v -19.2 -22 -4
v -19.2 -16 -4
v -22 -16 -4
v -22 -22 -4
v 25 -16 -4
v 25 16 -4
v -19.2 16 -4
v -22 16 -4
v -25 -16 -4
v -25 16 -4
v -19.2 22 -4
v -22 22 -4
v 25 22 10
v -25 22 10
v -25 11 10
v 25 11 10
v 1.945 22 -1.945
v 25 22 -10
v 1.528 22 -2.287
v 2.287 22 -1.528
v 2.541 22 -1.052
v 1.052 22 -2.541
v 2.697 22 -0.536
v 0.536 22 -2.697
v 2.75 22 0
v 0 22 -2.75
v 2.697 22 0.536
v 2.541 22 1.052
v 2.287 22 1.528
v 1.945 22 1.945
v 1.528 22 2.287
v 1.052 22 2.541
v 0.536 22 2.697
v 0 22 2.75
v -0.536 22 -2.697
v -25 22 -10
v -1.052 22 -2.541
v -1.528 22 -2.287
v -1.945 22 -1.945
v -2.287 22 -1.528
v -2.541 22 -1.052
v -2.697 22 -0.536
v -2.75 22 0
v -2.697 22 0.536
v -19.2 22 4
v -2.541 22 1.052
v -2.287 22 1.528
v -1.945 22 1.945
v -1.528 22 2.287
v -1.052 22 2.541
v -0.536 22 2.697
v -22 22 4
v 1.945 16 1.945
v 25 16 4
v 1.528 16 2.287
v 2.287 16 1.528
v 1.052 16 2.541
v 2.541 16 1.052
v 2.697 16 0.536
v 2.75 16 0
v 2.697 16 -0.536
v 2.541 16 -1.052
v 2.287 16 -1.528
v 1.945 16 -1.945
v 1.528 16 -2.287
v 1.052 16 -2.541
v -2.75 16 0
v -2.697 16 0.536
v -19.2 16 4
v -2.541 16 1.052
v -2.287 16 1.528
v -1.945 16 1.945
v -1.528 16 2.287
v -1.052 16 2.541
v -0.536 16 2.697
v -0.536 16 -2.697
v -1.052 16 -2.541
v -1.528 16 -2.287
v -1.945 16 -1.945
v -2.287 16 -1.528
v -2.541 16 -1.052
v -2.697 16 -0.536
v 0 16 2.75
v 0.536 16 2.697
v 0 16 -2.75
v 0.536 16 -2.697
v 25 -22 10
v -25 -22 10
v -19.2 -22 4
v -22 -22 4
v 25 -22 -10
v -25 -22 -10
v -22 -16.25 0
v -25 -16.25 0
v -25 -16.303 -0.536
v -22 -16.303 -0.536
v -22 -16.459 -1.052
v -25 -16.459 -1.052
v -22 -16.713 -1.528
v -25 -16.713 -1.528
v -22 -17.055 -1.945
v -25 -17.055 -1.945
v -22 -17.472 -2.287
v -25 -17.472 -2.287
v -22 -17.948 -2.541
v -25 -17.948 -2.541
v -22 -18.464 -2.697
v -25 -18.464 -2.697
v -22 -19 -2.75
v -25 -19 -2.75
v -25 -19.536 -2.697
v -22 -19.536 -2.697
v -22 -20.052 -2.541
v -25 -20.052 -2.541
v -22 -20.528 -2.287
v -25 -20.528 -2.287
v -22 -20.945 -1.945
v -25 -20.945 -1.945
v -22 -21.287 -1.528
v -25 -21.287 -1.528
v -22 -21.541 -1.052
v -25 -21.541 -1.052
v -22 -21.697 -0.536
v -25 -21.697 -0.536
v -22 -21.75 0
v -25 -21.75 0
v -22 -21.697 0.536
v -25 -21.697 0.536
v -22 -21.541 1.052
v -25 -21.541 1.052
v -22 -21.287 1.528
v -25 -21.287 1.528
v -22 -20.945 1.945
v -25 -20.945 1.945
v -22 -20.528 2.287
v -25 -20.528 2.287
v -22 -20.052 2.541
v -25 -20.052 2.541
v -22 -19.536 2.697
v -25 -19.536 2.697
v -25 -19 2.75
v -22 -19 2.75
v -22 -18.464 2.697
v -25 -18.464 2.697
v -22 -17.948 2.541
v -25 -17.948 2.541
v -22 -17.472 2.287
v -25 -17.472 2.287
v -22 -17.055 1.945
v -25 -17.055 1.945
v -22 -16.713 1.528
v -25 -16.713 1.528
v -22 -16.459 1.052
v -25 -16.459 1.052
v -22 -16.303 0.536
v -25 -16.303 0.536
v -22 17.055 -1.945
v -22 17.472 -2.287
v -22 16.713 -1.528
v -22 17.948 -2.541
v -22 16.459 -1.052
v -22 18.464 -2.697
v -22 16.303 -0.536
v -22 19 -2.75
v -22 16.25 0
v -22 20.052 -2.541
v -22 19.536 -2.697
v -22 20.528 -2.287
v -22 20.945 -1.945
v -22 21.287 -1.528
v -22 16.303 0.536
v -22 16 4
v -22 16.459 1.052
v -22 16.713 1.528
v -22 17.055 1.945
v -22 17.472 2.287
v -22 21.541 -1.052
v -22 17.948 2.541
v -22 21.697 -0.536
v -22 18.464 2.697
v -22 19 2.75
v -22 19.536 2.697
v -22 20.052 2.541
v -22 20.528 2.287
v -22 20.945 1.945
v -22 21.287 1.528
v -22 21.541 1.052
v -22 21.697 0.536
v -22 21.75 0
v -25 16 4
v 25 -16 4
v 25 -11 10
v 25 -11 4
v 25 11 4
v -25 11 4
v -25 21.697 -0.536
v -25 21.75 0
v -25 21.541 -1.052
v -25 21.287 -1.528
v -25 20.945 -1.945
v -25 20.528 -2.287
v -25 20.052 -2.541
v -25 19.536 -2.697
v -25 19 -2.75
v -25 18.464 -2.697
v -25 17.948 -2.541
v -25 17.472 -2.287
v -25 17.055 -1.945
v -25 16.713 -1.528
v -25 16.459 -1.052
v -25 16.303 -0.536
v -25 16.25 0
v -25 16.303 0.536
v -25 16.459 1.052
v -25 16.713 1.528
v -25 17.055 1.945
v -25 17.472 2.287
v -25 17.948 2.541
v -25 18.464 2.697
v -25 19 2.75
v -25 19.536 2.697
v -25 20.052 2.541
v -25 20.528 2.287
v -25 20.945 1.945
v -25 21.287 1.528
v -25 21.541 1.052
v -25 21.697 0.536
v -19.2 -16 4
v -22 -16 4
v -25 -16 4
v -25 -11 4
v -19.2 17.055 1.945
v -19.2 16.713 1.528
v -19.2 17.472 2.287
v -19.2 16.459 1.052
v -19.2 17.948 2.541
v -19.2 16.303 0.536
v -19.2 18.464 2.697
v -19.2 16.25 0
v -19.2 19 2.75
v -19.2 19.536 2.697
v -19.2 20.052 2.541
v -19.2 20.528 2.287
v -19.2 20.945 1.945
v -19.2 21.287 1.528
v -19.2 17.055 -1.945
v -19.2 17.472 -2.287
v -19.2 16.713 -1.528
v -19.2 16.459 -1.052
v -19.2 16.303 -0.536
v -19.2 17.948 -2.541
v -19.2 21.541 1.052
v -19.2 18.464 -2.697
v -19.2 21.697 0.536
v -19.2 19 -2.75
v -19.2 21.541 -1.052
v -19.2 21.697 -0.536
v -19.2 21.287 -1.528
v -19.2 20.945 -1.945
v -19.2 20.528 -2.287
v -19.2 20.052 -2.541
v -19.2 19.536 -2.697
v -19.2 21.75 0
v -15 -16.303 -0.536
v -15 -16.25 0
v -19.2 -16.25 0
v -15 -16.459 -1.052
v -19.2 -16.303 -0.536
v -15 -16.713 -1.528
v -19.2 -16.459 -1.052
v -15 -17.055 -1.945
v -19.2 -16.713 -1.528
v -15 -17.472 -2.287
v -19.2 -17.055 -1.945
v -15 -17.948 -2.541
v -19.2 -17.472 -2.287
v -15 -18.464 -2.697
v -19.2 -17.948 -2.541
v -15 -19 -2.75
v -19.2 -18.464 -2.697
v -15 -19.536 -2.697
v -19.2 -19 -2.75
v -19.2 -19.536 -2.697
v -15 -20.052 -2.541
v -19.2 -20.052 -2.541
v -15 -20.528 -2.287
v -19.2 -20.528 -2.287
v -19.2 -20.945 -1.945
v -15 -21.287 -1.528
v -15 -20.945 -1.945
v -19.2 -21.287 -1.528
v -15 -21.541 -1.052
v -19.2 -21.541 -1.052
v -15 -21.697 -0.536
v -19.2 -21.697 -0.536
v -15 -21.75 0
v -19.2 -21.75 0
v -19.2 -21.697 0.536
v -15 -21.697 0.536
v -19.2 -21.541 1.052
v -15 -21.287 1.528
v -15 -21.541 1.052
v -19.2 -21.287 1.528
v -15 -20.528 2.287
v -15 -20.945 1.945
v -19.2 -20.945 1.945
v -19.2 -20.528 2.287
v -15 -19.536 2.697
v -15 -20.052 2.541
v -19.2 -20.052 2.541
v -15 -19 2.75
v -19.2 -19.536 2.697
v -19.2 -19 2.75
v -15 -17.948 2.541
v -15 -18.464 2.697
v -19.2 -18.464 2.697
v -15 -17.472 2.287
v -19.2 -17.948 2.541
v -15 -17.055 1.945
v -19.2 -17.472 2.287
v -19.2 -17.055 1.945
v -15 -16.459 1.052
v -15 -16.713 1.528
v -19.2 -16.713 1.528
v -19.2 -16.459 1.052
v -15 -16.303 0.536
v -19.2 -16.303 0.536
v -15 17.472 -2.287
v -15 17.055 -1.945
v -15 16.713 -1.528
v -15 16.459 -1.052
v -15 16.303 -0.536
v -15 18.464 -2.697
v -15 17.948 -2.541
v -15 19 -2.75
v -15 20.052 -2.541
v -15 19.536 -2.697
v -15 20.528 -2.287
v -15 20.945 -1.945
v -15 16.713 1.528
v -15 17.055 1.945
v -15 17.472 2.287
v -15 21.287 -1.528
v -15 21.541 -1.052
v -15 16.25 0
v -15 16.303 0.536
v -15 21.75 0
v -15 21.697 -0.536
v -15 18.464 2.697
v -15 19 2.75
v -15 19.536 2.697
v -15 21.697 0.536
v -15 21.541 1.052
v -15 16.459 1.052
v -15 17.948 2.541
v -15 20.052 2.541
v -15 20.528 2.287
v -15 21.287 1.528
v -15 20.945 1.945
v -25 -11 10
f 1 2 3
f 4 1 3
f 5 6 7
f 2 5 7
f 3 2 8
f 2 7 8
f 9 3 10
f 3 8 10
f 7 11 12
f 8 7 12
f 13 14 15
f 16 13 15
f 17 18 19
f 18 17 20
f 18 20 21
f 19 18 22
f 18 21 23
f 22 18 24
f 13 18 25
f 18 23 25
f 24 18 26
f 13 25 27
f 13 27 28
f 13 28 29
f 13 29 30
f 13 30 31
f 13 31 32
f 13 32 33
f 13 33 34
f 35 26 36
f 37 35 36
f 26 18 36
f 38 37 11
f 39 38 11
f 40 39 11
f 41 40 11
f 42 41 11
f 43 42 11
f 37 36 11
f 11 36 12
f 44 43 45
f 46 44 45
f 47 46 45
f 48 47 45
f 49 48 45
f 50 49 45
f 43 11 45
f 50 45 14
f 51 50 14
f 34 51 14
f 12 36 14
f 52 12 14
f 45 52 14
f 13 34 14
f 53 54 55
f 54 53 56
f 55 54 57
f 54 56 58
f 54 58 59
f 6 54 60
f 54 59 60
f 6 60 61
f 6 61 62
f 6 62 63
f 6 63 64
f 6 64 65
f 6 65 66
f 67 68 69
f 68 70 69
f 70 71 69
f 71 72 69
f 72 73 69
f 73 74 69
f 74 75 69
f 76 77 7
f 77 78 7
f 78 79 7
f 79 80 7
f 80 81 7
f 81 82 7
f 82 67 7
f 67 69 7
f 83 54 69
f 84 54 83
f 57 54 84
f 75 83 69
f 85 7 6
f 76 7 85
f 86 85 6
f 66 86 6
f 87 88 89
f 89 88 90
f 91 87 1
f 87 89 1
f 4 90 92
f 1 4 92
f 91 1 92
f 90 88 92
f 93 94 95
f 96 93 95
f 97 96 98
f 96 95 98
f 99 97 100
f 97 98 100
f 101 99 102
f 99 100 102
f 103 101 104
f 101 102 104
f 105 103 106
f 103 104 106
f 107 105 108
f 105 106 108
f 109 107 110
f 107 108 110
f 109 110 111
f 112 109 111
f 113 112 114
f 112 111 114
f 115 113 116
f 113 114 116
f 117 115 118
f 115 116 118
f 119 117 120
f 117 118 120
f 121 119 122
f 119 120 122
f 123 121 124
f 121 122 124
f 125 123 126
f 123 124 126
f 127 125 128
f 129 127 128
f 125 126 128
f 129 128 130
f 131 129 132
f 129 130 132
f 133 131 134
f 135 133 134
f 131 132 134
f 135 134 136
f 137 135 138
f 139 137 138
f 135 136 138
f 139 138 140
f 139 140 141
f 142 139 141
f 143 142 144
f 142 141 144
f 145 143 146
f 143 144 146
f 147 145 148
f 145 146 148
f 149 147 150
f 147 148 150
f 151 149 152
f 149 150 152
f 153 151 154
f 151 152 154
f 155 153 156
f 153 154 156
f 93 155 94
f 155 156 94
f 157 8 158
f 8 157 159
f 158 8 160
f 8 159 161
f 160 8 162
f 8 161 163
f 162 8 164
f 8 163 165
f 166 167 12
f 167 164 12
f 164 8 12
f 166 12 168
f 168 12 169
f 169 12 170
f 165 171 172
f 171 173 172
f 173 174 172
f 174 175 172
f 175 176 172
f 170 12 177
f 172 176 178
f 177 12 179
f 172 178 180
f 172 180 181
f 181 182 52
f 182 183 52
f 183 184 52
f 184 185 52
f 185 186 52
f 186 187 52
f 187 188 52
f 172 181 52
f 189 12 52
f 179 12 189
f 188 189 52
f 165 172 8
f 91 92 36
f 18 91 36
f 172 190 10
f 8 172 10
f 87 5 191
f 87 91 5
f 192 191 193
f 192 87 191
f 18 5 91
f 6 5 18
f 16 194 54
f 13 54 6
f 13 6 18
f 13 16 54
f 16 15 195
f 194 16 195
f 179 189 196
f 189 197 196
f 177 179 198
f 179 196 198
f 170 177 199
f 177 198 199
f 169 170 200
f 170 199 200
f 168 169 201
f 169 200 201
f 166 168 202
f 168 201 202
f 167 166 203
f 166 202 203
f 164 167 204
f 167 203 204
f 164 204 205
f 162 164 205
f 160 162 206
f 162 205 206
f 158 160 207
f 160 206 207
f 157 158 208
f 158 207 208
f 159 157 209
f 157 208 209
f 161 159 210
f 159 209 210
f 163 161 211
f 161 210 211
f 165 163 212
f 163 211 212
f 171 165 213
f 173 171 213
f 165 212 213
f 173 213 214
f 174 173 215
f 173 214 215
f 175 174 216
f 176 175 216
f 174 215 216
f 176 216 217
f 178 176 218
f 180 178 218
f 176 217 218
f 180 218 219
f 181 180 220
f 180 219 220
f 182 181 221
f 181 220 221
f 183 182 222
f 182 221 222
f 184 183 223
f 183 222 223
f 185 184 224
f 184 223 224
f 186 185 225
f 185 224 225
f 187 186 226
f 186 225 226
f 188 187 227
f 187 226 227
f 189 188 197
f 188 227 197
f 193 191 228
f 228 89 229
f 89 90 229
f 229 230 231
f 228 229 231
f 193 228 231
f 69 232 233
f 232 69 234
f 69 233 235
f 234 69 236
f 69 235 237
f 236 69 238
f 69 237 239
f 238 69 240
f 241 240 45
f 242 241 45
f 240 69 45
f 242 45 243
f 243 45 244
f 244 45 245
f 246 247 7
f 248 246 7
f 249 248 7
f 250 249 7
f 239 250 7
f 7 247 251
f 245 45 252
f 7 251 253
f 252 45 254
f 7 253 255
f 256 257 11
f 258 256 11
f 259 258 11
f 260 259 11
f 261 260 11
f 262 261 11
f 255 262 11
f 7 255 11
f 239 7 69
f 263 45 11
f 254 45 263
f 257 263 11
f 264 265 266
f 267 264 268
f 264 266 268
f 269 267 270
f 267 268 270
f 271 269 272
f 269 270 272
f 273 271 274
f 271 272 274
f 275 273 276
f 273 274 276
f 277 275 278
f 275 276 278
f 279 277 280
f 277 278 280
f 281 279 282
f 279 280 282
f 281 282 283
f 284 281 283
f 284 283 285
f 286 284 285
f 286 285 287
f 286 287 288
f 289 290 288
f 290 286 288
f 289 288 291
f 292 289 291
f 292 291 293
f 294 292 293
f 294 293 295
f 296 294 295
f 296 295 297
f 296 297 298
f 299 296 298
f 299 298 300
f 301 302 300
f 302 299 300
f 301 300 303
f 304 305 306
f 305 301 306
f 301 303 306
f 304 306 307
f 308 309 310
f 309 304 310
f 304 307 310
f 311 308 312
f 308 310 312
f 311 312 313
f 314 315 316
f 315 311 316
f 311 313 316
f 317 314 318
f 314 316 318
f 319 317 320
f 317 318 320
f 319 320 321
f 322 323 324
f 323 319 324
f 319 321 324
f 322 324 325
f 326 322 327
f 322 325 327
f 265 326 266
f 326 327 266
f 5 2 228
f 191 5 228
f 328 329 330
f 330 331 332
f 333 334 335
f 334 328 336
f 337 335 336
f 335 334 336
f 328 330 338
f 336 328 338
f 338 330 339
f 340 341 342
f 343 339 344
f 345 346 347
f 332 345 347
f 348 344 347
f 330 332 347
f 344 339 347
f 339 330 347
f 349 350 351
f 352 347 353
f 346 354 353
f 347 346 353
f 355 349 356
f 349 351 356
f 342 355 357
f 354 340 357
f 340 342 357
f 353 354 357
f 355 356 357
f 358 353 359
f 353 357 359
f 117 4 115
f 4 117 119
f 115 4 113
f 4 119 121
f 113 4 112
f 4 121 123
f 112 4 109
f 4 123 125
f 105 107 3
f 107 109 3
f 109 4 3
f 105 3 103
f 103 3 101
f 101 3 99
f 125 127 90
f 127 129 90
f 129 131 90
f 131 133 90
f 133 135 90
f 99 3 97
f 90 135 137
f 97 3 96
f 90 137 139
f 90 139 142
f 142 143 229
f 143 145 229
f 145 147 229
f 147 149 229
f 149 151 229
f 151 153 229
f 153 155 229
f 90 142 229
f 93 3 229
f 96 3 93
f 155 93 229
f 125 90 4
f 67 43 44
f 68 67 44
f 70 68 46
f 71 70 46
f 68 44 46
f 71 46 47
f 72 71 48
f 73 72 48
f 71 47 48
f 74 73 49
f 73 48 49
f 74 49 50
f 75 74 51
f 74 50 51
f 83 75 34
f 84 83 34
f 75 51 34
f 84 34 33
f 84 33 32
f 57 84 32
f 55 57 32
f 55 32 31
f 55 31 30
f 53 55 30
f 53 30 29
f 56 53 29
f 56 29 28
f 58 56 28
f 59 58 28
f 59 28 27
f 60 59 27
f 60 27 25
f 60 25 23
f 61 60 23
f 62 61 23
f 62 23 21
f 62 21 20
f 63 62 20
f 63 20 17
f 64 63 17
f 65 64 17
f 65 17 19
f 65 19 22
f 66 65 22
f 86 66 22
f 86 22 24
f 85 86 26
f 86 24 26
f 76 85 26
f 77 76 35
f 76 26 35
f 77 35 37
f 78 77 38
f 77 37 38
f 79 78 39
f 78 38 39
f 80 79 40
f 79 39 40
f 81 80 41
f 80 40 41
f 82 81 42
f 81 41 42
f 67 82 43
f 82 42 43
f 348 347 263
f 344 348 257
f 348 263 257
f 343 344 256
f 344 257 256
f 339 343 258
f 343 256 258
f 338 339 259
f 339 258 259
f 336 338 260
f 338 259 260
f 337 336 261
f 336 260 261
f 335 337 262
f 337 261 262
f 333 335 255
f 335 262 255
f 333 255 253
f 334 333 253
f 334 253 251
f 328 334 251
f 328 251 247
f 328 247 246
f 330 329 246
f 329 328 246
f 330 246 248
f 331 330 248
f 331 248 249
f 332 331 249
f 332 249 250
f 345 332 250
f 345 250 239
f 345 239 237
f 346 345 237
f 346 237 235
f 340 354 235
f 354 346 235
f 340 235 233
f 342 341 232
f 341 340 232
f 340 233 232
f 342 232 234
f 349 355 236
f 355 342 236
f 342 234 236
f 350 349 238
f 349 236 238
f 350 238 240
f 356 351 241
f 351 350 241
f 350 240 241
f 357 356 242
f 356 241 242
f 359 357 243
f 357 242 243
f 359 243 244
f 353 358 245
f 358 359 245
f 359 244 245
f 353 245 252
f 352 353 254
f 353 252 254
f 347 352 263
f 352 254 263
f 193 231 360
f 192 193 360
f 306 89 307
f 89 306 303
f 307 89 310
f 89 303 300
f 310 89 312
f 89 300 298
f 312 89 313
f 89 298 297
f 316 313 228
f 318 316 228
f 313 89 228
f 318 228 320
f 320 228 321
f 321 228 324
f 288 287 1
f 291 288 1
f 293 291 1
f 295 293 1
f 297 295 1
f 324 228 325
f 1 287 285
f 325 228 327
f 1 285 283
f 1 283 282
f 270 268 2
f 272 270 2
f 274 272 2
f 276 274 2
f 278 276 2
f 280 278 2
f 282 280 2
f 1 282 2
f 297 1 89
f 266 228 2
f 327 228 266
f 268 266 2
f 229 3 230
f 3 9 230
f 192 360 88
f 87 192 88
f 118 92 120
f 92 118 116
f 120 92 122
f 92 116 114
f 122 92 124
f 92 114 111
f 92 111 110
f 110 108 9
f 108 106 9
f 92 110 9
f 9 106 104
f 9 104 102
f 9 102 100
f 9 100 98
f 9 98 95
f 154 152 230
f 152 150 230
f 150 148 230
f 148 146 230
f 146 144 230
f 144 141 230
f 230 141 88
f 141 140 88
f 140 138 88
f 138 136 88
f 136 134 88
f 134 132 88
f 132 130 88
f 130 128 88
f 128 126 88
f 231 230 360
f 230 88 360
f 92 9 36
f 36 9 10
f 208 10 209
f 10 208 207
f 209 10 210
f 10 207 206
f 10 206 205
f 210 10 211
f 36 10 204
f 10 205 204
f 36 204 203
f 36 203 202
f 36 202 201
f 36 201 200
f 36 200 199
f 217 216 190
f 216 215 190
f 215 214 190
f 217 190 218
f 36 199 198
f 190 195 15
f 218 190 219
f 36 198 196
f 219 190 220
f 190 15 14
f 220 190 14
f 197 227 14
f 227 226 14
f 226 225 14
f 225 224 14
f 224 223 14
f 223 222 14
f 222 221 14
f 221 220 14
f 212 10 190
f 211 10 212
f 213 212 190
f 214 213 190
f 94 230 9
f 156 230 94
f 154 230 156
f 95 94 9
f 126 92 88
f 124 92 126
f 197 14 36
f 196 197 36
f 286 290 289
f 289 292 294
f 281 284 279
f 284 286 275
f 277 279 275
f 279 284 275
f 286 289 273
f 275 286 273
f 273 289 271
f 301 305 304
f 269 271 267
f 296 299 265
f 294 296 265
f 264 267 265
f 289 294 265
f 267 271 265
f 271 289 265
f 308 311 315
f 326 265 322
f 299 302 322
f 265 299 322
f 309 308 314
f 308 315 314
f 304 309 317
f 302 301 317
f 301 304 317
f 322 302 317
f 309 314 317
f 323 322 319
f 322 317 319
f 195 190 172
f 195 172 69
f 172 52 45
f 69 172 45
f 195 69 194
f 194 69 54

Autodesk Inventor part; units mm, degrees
ref_plane "XY Plane" through (0, 0, 0) normal (0, 0, 1) x (1, 0, 0)
sketch "Sketch1" plane through (0, 0, 0) normal (1, 0, 0) x (0, 1, 0)
  line L0 (11, 10) -> (11, 4)
  line L1 (11, 4) -> (16, 4)
  line L2 (16, 4) -> (16, -4)
  line L3 (16, -4) -> (-16, -4)
  line L4 (-16, -4) -> (-16, 4)
  line L5 (-16, 4) -> (-11, 4)
  line L6 (-11, 4) -> (-11, 10)
  line L7 (-11, 10) -> (-22, 10)
  line L8 (-22, 10) -> (-22, -10)
  line L9 (-22, -10) -> (22, -10)
  line L10 (22, -10) -> (22, 10)
  line L11 (22, 10) -> (11, 10)
  line L12 (11, 7) -> (-11, 7) construction
  line L13 (16, 0) -> (-16, 0) construction
  point P0 (0, 0)
  point P1 (-13.5, 4)
  point P2 (13.5, 4)
  point P3 (16.5, 10)
  point P4 (-16.5, 10)
  point P5 (22, 0)
  point P6 (0, -10)
  point P7 (0, 7)
  point P8 (0, 0)
  dimension "d0" = 22
  dimension "d1" = 32
  dimension "d2" = 6
  dimension "d3" = 14
  dimension "d4" = 44
  dimension "d5" = 20
extrude "Extrusion1" add sketch "Sketch1" along normal mid plane 50
ref_plane "Work Plane1" through (0, 22, 0) normal (0, 1, 0) x (-1, 0, 0)
sketch "Sketch2" plane through (0, 22, 0) normal (0, 1, 0) x (-1, 0, 0)
  line L0 (25, 10) -> (-25, 10) construction
  line L1 (-25, -10) -> (-25, 10) construction
  line L2 (25, -10) -> (-25, -10) construction
  line L3 (25, 10) -> (25, -10) construction
  line L4 (-25, 0) -> (25, 0) construction
  circle A0 centre (0, 0) radius 2.75
  point P0 (0, 0)
  dimension "d9" = 5.5
  dimension "d10" = 25
extrude "Extrusion2" cut sketch "Sketch2" against normal up to surface (6 mm away)
sketch "Sketch3" plane through (0, 22, 0) normal (0, 1, 0) x (-1, 0, 0)
  line L0 (22, 4) -> (19.2, 4)
  line L1 (19.2, 4) -> (19.2, -4)
  line L2 (19.2, -4) -> (22, -4)
  line L3 (22, -4) -> (22, 4)
  line L4 (25, 10) -> (25, -10) construction
  point P0 (0, 0)
  point P1 (19.2, 0)
  dimension "d13" = 8
  dimension "d14" = 3
  dimension "d15" = 2.8
extrude "Extrusion3" cut sketch "Sketch3" against normal through all
ref_plane "Work Plane2" through (-25, 0, 0) normal (1, 0, 0) x (0, 1, 0)
sketch "Sketch4" plane through (-25, 0, 0) normal (1, 0, 0) x (0, 1, 0)
  circle A0 centre (19, 0) radius 2.75
  line L0 (0, -10) -> (0, 10) construction
  line L1 (22, -10) -> (-22, -10) construction
  circle A1 centre (-19, 0) radius 2.75
  point P0 (0, 0)
  point P1 (11, 10)
  point P2 (0, 0)
  dimension "d19" = 5.5
  dimension "d20" = 19
extrude "Extrusion4" cut sketch "Sketch4" along normal blind 10
properties part number "cuerpo_obj2"
